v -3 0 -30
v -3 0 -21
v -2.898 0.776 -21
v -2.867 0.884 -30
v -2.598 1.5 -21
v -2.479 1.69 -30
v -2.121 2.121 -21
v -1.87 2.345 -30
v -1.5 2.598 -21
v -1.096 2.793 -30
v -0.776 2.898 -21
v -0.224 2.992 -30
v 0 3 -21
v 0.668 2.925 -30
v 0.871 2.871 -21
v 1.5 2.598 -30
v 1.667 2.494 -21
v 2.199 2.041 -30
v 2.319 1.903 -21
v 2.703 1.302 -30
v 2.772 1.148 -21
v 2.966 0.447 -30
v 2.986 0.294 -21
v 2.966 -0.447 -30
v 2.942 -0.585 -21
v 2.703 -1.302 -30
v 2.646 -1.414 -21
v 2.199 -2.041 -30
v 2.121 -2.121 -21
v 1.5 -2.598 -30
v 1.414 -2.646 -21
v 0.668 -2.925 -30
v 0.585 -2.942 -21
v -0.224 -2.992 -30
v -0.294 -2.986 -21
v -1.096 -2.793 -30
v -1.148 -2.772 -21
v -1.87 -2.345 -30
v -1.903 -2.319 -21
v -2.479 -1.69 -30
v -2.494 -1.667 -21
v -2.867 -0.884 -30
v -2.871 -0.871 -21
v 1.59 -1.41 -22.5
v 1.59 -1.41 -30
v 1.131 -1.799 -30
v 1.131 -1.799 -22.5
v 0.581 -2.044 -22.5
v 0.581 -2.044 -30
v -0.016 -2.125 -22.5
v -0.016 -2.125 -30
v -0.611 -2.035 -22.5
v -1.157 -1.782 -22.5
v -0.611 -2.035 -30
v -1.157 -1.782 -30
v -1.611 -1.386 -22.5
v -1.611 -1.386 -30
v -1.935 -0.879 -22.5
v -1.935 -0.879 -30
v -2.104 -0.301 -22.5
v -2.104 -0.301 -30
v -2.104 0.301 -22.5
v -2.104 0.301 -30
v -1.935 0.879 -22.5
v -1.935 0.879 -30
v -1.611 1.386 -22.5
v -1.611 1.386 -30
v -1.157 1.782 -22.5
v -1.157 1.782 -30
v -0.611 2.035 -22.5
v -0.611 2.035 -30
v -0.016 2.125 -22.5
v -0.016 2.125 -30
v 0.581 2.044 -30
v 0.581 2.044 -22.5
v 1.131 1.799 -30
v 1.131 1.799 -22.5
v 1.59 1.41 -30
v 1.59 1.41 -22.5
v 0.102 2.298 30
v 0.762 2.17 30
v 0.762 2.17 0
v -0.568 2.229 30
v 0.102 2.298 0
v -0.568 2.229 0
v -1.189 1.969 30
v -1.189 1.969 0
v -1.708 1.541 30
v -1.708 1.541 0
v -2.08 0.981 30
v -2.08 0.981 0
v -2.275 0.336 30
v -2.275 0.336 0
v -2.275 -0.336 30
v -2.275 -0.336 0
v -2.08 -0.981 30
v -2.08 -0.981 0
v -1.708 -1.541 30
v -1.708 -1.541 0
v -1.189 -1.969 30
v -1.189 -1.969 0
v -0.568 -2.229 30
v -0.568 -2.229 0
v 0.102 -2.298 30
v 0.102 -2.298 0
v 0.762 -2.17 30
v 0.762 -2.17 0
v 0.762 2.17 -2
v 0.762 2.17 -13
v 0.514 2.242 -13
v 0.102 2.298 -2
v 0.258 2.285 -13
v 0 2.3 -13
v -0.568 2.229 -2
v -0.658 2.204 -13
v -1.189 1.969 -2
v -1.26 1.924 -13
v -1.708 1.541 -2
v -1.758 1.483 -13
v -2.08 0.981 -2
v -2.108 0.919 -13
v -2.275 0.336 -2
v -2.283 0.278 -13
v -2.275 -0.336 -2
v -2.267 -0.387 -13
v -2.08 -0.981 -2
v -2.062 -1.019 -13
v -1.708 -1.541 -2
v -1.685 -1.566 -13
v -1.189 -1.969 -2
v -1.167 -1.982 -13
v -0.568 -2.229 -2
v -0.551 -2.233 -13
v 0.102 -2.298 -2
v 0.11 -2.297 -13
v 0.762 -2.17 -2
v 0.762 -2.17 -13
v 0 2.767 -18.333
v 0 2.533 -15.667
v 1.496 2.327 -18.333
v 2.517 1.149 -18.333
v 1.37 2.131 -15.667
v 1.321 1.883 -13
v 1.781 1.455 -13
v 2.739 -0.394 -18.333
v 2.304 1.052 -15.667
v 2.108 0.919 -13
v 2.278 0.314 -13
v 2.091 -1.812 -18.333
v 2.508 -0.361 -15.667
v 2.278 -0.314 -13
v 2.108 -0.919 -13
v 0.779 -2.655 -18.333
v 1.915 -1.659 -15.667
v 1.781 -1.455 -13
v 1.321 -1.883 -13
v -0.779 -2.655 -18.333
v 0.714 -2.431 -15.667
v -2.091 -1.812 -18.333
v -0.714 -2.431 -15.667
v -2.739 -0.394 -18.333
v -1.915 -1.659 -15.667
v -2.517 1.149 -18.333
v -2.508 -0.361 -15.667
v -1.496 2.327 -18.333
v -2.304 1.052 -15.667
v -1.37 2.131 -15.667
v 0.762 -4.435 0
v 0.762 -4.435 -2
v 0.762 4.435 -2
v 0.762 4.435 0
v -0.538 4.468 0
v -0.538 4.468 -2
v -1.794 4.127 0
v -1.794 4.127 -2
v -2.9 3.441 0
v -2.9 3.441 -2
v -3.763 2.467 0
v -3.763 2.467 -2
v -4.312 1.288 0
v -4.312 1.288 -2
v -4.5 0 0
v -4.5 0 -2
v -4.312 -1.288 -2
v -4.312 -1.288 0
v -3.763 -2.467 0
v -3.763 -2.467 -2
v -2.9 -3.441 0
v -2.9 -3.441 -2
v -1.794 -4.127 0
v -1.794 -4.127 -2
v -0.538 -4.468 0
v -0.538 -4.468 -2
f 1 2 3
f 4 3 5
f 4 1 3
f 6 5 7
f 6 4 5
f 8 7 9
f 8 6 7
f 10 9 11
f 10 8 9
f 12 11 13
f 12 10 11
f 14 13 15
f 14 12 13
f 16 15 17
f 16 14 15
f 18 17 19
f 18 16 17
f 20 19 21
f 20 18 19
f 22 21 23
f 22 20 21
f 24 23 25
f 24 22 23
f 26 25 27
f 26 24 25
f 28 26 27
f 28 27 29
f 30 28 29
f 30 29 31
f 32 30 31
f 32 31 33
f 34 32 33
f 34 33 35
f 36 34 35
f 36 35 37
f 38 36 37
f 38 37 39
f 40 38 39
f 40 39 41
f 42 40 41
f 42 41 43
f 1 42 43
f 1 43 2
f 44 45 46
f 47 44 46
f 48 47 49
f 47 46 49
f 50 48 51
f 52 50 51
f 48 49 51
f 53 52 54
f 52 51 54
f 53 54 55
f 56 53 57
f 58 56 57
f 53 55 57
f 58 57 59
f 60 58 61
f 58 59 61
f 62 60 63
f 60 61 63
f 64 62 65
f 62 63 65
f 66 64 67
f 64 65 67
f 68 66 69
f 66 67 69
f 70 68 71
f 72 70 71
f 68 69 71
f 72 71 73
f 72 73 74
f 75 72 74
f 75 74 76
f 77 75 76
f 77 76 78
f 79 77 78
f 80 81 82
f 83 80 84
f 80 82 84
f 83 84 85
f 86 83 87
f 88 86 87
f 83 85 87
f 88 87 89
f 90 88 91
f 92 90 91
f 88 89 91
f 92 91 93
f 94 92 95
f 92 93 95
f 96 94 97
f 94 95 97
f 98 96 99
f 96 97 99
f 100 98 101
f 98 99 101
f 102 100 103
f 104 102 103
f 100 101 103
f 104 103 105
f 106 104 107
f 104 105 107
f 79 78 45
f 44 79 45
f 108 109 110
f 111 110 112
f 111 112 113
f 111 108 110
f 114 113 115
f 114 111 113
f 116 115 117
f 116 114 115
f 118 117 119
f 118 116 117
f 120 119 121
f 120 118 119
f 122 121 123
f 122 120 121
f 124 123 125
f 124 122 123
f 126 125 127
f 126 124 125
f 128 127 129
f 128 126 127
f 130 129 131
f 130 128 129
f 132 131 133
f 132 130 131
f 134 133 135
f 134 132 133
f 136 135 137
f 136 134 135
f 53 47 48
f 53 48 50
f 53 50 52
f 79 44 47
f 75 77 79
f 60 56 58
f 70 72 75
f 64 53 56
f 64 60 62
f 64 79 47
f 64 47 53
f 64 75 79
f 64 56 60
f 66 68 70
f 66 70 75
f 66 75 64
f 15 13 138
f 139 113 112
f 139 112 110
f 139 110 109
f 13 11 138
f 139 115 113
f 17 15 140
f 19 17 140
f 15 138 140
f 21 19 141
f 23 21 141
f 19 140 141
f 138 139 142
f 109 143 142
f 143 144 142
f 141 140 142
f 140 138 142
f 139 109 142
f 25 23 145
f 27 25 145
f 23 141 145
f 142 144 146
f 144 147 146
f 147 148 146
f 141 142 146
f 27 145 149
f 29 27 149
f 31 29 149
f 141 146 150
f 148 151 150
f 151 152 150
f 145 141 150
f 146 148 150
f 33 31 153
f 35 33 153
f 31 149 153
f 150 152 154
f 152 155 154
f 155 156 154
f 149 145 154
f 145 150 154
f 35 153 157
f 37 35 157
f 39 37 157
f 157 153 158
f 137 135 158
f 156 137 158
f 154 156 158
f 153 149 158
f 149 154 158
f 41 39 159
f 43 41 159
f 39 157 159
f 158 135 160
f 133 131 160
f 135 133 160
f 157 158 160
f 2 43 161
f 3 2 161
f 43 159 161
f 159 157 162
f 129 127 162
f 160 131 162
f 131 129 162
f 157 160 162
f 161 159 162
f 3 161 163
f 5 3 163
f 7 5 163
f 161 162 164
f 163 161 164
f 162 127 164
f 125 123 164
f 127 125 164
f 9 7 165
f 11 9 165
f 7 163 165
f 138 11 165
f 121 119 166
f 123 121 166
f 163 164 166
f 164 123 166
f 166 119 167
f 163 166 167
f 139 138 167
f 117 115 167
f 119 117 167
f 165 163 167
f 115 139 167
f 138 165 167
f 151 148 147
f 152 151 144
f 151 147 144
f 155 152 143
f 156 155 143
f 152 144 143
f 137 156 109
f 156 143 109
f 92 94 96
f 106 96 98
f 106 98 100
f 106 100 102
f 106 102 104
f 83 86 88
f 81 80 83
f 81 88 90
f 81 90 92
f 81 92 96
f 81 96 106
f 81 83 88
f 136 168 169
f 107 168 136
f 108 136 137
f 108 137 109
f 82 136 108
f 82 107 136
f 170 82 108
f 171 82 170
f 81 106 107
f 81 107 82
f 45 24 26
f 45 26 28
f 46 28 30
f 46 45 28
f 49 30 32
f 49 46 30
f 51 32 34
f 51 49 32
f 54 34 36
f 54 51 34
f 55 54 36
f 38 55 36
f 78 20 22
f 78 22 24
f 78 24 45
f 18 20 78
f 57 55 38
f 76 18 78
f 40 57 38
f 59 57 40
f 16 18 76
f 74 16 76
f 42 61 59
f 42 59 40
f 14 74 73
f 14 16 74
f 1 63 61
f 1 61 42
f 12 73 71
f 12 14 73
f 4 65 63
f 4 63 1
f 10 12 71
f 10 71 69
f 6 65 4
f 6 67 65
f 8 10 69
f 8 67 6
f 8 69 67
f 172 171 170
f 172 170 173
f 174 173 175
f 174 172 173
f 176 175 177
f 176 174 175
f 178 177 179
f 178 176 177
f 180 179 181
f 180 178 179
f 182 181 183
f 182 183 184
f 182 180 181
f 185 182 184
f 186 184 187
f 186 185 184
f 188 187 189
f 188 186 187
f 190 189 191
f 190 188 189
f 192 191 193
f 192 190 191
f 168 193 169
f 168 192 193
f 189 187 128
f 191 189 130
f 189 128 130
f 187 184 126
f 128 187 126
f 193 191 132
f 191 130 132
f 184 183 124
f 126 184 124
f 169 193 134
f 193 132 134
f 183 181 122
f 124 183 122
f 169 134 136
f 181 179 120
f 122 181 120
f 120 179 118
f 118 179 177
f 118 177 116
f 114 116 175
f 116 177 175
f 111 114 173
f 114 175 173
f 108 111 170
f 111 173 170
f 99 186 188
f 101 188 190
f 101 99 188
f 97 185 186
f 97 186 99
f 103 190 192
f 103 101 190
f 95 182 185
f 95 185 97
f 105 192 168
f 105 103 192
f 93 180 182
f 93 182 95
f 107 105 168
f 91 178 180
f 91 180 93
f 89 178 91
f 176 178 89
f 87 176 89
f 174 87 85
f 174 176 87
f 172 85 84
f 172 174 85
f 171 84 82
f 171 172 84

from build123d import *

# Parameters (mm, degrees)
BOSS_EXTRUDE2_DEPTH      = 2
BOSS_EXTRUDE3_DEPTH      = 30
BOSS_EXTRUDE3_DEPTH_BACK = 30
SKETCH3_R                = 3
BOSS_EXTRUDE4_DEPTH      = 17
CUT_EXTRUDE1_DEPTH       = 7.5


with BuildPart() as part:
    # Sketch2 → Boss-Extrude2 (new body)
    with BuildSketch(Plane.XY):
        with BuildLine():
            Line((0.762299154, -4.434963359), (0.762299154, 4.434963359))
            ThreePointArc((0.762299154, 4.434963359), (-4.5, 0), (0.762299154, -4.434963359))
        make_face()
    extrude(amount=-BOSS_EXTRUDE2_DEPTH)

    # Sketch1 → Boss-Extrude3 (add, two sides)
    with BuildSketch(Plane.XY) as boss_extrude3_sk:
        with BuildLine():
            Line((0.762299154, -2.17), (0.762299154, 2.17))
            ThreePointArc((0.762299154, 2.17), (-2.3, 0), (0.762299154, -2.17))
        make_face()
    extrude(amount=BOSS_EXTRUDE3_DEPTH)
    extrude(boss_extrude3_sk.sketch, amount=-BOSS_EXTRUDE3_DEPTH_BACK)

    # Sketch3 → Boss-Extrude4 (add)
    with BuildSketch(Plane(origin=(0, 0, -30), x_dir=(-1, 0, 0), z_dir=(0, 0, -1))):
        Circle(SKETCH3_R)
    extrude(amount=-BOSS_EXTRUDE4_DEPTH)

    # Sketch4 → Cut-Extrude1 (cut)
    with BuildSketch(Plane(origin=(0, 0, -30), x_dir=(-1, 0, 0), z_dir=(0, 0, -1))):
        with BuildLine():
            Line((-1.59, 1.409796085), (-1.59, -1.409796085))
            ThreePointArc((-1.59, -1.409796085), (2.125, 0), (-1.59, 1.409796085))
        make_face()
    extrude(amount=-CUT_EXTRUDE1_DEPTH, mode=Mode.SUBTRACT)

    # Sketch7 → Cut-Revolve1 (revolve, cut)
    with BuildSketch(Plane(origin=(0, 0, 0), x_dir=(0, 0, -1), z_dir=(1, 0, 0))):
        Polygon((13, 3), (21, 3), (13, 2.3), align=None)
    revolve(axis=Axis((0, 0, 30.362206594), (0, 0, -1)), mode=Mode.SUBTRACT)


solid = part.part
